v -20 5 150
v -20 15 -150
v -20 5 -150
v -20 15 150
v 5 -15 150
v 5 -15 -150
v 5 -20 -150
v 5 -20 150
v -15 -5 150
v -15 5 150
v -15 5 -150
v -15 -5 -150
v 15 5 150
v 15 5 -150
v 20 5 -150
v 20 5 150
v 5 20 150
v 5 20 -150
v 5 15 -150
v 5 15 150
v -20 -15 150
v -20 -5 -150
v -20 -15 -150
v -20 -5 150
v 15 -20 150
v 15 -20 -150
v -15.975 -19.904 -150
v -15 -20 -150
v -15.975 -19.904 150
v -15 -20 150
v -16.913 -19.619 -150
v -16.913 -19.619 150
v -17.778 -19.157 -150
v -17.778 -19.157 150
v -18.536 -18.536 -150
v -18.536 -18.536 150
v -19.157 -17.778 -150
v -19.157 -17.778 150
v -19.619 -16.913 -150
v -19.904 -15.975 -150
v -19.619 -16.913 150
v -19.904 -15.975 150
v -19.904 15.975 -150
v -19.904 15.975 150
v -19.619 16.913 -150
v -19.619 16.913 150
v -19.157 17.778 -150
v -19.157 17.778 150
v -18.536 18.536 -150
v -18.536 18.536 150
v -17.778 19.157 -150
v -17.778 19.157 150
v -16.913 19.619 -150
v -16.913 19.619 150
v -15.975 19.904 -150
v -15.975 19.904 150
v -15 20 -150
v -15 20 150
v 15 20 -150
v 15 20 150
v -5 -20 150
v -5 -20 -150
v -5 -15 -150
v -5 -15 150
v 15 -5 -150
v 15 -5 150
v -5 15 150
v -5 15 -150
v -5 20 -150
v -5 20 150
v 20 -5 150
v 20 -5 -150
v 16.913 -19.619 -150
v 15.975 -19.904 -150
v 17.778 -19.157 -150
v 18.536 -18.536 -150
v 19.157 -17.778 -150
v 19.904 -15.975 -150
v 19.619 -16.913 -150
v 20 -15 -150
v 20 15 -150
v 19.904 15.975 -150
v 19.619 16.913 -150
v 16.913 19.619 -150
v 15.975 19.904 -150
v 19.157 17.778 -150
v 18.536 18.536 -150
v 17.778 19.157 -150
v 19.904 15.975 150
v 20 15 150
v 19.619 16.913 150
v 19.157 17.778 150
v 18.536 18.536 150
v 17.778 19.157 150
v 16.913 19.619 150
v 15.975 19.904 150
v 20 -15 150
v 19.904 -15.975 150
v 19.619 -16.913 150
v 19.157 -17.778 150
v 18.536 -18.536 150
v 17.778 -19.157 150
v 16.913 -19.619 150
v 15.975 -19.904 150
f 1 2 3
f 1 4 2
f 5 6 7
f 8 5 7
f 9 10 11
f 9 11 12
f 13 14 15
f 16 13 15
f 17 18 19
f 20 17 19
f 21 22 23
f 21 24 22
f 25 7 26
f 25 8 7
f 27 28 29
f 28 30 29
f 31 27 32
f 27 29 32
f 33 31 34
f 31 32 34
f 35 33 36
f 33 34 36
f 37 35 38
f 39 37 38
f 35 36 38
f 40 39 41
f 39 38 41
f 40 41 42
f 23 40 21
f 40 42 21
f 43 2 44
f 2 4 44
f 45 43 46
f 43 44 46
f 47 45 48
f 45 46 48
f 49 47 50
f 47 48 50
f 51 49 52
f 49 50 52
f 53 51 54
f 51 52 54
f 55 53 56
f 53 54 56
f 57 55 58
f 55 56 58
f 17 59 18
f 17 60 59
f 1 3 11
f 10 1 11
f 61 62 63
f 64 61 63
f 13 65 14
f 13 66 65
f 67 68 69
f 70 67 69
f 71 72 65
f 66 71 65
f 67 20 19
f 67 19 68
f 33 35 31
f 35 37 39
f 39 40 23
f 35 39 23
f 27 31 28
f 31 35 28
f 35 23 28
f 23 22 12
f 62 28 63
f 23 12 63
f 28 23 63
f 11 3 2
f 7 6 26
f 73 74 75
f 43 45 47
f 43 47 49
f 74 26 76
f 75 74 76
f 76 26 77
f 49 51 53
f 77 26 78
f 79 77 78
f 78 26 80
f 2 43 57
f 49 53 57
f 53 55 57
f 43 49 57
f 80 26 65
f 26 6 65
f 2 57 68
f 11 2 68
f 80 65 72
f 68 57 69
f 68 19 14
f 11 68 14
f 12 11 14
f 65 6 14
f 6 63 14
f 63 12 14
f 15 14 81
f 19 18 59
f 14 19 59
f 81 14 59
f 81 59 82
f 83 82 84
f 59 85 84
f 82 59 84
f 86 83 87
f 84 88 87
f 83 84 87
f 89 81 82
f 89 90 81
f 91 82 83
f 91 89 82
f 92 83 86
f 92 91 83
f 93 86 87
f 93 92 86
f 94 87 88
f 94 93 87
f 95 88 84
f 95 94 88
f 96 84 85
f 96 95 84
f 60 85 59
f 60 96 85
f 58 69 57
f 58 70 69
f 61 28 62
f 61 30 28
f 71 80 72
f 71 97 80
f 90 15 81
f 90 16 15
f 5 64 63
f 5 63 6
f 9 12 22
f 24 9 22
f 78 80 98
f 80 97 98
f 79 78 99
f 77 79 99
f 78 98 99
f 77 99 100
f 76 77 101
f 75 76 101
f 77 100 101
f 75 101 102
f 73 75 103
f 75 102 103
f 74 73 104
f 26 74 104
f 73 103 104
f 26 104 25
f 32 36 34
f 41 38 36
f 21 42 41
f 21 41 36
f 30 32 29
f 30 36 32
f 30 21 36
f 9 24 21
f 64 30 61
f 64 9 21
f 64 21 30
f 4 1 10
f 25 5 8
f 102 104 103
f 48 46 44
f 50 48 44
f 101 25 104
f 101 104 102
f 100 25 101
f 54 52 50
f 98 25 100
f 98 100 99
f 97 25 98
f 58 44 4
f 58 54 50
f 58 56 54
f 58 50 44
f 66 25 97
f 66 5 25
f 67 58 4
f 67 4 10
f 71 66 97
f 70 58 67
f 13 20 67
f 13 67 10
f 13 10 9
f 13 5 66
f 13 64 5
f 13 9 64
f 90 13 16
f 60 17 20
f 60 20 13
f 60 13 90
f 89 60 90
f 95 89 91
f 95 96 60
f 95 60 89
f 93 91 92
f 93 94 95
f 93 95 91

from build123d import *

# Parameters (mm, degrees)
F1_DEPTH = 150
F2_R     = 5


with BuildPart() as f1:
    # F0 (on Top) → F1 (new body, symmetric)
    with BuildSketch(Plane.XY):
        Polygon((20, 5), (20, 20), (5, 20), (5, 15), (-5, 15), (-5, 20), (-20, 20), (-20, 5), (-15, 5), (-15, -5), (-20, -5), (-20, -20), (-5, -20), (-5, -15), (5, -15), (5, -20), (20, -20), (20, -5), (15, -5), (15, 5), align=None)
    extrude(amount=F1_DEPTH, both=True)

    # F2
    f2_edges = [f1.edges().sort_by_distance(p)[0] for p in [
        (20, 20, 0),
        (-20, 20, 0),
        (-20, -20, 0),
        (20, -20, 0),
    ]]
    fillet(f2_edges, radius=F2_R)


solid = f1.part
